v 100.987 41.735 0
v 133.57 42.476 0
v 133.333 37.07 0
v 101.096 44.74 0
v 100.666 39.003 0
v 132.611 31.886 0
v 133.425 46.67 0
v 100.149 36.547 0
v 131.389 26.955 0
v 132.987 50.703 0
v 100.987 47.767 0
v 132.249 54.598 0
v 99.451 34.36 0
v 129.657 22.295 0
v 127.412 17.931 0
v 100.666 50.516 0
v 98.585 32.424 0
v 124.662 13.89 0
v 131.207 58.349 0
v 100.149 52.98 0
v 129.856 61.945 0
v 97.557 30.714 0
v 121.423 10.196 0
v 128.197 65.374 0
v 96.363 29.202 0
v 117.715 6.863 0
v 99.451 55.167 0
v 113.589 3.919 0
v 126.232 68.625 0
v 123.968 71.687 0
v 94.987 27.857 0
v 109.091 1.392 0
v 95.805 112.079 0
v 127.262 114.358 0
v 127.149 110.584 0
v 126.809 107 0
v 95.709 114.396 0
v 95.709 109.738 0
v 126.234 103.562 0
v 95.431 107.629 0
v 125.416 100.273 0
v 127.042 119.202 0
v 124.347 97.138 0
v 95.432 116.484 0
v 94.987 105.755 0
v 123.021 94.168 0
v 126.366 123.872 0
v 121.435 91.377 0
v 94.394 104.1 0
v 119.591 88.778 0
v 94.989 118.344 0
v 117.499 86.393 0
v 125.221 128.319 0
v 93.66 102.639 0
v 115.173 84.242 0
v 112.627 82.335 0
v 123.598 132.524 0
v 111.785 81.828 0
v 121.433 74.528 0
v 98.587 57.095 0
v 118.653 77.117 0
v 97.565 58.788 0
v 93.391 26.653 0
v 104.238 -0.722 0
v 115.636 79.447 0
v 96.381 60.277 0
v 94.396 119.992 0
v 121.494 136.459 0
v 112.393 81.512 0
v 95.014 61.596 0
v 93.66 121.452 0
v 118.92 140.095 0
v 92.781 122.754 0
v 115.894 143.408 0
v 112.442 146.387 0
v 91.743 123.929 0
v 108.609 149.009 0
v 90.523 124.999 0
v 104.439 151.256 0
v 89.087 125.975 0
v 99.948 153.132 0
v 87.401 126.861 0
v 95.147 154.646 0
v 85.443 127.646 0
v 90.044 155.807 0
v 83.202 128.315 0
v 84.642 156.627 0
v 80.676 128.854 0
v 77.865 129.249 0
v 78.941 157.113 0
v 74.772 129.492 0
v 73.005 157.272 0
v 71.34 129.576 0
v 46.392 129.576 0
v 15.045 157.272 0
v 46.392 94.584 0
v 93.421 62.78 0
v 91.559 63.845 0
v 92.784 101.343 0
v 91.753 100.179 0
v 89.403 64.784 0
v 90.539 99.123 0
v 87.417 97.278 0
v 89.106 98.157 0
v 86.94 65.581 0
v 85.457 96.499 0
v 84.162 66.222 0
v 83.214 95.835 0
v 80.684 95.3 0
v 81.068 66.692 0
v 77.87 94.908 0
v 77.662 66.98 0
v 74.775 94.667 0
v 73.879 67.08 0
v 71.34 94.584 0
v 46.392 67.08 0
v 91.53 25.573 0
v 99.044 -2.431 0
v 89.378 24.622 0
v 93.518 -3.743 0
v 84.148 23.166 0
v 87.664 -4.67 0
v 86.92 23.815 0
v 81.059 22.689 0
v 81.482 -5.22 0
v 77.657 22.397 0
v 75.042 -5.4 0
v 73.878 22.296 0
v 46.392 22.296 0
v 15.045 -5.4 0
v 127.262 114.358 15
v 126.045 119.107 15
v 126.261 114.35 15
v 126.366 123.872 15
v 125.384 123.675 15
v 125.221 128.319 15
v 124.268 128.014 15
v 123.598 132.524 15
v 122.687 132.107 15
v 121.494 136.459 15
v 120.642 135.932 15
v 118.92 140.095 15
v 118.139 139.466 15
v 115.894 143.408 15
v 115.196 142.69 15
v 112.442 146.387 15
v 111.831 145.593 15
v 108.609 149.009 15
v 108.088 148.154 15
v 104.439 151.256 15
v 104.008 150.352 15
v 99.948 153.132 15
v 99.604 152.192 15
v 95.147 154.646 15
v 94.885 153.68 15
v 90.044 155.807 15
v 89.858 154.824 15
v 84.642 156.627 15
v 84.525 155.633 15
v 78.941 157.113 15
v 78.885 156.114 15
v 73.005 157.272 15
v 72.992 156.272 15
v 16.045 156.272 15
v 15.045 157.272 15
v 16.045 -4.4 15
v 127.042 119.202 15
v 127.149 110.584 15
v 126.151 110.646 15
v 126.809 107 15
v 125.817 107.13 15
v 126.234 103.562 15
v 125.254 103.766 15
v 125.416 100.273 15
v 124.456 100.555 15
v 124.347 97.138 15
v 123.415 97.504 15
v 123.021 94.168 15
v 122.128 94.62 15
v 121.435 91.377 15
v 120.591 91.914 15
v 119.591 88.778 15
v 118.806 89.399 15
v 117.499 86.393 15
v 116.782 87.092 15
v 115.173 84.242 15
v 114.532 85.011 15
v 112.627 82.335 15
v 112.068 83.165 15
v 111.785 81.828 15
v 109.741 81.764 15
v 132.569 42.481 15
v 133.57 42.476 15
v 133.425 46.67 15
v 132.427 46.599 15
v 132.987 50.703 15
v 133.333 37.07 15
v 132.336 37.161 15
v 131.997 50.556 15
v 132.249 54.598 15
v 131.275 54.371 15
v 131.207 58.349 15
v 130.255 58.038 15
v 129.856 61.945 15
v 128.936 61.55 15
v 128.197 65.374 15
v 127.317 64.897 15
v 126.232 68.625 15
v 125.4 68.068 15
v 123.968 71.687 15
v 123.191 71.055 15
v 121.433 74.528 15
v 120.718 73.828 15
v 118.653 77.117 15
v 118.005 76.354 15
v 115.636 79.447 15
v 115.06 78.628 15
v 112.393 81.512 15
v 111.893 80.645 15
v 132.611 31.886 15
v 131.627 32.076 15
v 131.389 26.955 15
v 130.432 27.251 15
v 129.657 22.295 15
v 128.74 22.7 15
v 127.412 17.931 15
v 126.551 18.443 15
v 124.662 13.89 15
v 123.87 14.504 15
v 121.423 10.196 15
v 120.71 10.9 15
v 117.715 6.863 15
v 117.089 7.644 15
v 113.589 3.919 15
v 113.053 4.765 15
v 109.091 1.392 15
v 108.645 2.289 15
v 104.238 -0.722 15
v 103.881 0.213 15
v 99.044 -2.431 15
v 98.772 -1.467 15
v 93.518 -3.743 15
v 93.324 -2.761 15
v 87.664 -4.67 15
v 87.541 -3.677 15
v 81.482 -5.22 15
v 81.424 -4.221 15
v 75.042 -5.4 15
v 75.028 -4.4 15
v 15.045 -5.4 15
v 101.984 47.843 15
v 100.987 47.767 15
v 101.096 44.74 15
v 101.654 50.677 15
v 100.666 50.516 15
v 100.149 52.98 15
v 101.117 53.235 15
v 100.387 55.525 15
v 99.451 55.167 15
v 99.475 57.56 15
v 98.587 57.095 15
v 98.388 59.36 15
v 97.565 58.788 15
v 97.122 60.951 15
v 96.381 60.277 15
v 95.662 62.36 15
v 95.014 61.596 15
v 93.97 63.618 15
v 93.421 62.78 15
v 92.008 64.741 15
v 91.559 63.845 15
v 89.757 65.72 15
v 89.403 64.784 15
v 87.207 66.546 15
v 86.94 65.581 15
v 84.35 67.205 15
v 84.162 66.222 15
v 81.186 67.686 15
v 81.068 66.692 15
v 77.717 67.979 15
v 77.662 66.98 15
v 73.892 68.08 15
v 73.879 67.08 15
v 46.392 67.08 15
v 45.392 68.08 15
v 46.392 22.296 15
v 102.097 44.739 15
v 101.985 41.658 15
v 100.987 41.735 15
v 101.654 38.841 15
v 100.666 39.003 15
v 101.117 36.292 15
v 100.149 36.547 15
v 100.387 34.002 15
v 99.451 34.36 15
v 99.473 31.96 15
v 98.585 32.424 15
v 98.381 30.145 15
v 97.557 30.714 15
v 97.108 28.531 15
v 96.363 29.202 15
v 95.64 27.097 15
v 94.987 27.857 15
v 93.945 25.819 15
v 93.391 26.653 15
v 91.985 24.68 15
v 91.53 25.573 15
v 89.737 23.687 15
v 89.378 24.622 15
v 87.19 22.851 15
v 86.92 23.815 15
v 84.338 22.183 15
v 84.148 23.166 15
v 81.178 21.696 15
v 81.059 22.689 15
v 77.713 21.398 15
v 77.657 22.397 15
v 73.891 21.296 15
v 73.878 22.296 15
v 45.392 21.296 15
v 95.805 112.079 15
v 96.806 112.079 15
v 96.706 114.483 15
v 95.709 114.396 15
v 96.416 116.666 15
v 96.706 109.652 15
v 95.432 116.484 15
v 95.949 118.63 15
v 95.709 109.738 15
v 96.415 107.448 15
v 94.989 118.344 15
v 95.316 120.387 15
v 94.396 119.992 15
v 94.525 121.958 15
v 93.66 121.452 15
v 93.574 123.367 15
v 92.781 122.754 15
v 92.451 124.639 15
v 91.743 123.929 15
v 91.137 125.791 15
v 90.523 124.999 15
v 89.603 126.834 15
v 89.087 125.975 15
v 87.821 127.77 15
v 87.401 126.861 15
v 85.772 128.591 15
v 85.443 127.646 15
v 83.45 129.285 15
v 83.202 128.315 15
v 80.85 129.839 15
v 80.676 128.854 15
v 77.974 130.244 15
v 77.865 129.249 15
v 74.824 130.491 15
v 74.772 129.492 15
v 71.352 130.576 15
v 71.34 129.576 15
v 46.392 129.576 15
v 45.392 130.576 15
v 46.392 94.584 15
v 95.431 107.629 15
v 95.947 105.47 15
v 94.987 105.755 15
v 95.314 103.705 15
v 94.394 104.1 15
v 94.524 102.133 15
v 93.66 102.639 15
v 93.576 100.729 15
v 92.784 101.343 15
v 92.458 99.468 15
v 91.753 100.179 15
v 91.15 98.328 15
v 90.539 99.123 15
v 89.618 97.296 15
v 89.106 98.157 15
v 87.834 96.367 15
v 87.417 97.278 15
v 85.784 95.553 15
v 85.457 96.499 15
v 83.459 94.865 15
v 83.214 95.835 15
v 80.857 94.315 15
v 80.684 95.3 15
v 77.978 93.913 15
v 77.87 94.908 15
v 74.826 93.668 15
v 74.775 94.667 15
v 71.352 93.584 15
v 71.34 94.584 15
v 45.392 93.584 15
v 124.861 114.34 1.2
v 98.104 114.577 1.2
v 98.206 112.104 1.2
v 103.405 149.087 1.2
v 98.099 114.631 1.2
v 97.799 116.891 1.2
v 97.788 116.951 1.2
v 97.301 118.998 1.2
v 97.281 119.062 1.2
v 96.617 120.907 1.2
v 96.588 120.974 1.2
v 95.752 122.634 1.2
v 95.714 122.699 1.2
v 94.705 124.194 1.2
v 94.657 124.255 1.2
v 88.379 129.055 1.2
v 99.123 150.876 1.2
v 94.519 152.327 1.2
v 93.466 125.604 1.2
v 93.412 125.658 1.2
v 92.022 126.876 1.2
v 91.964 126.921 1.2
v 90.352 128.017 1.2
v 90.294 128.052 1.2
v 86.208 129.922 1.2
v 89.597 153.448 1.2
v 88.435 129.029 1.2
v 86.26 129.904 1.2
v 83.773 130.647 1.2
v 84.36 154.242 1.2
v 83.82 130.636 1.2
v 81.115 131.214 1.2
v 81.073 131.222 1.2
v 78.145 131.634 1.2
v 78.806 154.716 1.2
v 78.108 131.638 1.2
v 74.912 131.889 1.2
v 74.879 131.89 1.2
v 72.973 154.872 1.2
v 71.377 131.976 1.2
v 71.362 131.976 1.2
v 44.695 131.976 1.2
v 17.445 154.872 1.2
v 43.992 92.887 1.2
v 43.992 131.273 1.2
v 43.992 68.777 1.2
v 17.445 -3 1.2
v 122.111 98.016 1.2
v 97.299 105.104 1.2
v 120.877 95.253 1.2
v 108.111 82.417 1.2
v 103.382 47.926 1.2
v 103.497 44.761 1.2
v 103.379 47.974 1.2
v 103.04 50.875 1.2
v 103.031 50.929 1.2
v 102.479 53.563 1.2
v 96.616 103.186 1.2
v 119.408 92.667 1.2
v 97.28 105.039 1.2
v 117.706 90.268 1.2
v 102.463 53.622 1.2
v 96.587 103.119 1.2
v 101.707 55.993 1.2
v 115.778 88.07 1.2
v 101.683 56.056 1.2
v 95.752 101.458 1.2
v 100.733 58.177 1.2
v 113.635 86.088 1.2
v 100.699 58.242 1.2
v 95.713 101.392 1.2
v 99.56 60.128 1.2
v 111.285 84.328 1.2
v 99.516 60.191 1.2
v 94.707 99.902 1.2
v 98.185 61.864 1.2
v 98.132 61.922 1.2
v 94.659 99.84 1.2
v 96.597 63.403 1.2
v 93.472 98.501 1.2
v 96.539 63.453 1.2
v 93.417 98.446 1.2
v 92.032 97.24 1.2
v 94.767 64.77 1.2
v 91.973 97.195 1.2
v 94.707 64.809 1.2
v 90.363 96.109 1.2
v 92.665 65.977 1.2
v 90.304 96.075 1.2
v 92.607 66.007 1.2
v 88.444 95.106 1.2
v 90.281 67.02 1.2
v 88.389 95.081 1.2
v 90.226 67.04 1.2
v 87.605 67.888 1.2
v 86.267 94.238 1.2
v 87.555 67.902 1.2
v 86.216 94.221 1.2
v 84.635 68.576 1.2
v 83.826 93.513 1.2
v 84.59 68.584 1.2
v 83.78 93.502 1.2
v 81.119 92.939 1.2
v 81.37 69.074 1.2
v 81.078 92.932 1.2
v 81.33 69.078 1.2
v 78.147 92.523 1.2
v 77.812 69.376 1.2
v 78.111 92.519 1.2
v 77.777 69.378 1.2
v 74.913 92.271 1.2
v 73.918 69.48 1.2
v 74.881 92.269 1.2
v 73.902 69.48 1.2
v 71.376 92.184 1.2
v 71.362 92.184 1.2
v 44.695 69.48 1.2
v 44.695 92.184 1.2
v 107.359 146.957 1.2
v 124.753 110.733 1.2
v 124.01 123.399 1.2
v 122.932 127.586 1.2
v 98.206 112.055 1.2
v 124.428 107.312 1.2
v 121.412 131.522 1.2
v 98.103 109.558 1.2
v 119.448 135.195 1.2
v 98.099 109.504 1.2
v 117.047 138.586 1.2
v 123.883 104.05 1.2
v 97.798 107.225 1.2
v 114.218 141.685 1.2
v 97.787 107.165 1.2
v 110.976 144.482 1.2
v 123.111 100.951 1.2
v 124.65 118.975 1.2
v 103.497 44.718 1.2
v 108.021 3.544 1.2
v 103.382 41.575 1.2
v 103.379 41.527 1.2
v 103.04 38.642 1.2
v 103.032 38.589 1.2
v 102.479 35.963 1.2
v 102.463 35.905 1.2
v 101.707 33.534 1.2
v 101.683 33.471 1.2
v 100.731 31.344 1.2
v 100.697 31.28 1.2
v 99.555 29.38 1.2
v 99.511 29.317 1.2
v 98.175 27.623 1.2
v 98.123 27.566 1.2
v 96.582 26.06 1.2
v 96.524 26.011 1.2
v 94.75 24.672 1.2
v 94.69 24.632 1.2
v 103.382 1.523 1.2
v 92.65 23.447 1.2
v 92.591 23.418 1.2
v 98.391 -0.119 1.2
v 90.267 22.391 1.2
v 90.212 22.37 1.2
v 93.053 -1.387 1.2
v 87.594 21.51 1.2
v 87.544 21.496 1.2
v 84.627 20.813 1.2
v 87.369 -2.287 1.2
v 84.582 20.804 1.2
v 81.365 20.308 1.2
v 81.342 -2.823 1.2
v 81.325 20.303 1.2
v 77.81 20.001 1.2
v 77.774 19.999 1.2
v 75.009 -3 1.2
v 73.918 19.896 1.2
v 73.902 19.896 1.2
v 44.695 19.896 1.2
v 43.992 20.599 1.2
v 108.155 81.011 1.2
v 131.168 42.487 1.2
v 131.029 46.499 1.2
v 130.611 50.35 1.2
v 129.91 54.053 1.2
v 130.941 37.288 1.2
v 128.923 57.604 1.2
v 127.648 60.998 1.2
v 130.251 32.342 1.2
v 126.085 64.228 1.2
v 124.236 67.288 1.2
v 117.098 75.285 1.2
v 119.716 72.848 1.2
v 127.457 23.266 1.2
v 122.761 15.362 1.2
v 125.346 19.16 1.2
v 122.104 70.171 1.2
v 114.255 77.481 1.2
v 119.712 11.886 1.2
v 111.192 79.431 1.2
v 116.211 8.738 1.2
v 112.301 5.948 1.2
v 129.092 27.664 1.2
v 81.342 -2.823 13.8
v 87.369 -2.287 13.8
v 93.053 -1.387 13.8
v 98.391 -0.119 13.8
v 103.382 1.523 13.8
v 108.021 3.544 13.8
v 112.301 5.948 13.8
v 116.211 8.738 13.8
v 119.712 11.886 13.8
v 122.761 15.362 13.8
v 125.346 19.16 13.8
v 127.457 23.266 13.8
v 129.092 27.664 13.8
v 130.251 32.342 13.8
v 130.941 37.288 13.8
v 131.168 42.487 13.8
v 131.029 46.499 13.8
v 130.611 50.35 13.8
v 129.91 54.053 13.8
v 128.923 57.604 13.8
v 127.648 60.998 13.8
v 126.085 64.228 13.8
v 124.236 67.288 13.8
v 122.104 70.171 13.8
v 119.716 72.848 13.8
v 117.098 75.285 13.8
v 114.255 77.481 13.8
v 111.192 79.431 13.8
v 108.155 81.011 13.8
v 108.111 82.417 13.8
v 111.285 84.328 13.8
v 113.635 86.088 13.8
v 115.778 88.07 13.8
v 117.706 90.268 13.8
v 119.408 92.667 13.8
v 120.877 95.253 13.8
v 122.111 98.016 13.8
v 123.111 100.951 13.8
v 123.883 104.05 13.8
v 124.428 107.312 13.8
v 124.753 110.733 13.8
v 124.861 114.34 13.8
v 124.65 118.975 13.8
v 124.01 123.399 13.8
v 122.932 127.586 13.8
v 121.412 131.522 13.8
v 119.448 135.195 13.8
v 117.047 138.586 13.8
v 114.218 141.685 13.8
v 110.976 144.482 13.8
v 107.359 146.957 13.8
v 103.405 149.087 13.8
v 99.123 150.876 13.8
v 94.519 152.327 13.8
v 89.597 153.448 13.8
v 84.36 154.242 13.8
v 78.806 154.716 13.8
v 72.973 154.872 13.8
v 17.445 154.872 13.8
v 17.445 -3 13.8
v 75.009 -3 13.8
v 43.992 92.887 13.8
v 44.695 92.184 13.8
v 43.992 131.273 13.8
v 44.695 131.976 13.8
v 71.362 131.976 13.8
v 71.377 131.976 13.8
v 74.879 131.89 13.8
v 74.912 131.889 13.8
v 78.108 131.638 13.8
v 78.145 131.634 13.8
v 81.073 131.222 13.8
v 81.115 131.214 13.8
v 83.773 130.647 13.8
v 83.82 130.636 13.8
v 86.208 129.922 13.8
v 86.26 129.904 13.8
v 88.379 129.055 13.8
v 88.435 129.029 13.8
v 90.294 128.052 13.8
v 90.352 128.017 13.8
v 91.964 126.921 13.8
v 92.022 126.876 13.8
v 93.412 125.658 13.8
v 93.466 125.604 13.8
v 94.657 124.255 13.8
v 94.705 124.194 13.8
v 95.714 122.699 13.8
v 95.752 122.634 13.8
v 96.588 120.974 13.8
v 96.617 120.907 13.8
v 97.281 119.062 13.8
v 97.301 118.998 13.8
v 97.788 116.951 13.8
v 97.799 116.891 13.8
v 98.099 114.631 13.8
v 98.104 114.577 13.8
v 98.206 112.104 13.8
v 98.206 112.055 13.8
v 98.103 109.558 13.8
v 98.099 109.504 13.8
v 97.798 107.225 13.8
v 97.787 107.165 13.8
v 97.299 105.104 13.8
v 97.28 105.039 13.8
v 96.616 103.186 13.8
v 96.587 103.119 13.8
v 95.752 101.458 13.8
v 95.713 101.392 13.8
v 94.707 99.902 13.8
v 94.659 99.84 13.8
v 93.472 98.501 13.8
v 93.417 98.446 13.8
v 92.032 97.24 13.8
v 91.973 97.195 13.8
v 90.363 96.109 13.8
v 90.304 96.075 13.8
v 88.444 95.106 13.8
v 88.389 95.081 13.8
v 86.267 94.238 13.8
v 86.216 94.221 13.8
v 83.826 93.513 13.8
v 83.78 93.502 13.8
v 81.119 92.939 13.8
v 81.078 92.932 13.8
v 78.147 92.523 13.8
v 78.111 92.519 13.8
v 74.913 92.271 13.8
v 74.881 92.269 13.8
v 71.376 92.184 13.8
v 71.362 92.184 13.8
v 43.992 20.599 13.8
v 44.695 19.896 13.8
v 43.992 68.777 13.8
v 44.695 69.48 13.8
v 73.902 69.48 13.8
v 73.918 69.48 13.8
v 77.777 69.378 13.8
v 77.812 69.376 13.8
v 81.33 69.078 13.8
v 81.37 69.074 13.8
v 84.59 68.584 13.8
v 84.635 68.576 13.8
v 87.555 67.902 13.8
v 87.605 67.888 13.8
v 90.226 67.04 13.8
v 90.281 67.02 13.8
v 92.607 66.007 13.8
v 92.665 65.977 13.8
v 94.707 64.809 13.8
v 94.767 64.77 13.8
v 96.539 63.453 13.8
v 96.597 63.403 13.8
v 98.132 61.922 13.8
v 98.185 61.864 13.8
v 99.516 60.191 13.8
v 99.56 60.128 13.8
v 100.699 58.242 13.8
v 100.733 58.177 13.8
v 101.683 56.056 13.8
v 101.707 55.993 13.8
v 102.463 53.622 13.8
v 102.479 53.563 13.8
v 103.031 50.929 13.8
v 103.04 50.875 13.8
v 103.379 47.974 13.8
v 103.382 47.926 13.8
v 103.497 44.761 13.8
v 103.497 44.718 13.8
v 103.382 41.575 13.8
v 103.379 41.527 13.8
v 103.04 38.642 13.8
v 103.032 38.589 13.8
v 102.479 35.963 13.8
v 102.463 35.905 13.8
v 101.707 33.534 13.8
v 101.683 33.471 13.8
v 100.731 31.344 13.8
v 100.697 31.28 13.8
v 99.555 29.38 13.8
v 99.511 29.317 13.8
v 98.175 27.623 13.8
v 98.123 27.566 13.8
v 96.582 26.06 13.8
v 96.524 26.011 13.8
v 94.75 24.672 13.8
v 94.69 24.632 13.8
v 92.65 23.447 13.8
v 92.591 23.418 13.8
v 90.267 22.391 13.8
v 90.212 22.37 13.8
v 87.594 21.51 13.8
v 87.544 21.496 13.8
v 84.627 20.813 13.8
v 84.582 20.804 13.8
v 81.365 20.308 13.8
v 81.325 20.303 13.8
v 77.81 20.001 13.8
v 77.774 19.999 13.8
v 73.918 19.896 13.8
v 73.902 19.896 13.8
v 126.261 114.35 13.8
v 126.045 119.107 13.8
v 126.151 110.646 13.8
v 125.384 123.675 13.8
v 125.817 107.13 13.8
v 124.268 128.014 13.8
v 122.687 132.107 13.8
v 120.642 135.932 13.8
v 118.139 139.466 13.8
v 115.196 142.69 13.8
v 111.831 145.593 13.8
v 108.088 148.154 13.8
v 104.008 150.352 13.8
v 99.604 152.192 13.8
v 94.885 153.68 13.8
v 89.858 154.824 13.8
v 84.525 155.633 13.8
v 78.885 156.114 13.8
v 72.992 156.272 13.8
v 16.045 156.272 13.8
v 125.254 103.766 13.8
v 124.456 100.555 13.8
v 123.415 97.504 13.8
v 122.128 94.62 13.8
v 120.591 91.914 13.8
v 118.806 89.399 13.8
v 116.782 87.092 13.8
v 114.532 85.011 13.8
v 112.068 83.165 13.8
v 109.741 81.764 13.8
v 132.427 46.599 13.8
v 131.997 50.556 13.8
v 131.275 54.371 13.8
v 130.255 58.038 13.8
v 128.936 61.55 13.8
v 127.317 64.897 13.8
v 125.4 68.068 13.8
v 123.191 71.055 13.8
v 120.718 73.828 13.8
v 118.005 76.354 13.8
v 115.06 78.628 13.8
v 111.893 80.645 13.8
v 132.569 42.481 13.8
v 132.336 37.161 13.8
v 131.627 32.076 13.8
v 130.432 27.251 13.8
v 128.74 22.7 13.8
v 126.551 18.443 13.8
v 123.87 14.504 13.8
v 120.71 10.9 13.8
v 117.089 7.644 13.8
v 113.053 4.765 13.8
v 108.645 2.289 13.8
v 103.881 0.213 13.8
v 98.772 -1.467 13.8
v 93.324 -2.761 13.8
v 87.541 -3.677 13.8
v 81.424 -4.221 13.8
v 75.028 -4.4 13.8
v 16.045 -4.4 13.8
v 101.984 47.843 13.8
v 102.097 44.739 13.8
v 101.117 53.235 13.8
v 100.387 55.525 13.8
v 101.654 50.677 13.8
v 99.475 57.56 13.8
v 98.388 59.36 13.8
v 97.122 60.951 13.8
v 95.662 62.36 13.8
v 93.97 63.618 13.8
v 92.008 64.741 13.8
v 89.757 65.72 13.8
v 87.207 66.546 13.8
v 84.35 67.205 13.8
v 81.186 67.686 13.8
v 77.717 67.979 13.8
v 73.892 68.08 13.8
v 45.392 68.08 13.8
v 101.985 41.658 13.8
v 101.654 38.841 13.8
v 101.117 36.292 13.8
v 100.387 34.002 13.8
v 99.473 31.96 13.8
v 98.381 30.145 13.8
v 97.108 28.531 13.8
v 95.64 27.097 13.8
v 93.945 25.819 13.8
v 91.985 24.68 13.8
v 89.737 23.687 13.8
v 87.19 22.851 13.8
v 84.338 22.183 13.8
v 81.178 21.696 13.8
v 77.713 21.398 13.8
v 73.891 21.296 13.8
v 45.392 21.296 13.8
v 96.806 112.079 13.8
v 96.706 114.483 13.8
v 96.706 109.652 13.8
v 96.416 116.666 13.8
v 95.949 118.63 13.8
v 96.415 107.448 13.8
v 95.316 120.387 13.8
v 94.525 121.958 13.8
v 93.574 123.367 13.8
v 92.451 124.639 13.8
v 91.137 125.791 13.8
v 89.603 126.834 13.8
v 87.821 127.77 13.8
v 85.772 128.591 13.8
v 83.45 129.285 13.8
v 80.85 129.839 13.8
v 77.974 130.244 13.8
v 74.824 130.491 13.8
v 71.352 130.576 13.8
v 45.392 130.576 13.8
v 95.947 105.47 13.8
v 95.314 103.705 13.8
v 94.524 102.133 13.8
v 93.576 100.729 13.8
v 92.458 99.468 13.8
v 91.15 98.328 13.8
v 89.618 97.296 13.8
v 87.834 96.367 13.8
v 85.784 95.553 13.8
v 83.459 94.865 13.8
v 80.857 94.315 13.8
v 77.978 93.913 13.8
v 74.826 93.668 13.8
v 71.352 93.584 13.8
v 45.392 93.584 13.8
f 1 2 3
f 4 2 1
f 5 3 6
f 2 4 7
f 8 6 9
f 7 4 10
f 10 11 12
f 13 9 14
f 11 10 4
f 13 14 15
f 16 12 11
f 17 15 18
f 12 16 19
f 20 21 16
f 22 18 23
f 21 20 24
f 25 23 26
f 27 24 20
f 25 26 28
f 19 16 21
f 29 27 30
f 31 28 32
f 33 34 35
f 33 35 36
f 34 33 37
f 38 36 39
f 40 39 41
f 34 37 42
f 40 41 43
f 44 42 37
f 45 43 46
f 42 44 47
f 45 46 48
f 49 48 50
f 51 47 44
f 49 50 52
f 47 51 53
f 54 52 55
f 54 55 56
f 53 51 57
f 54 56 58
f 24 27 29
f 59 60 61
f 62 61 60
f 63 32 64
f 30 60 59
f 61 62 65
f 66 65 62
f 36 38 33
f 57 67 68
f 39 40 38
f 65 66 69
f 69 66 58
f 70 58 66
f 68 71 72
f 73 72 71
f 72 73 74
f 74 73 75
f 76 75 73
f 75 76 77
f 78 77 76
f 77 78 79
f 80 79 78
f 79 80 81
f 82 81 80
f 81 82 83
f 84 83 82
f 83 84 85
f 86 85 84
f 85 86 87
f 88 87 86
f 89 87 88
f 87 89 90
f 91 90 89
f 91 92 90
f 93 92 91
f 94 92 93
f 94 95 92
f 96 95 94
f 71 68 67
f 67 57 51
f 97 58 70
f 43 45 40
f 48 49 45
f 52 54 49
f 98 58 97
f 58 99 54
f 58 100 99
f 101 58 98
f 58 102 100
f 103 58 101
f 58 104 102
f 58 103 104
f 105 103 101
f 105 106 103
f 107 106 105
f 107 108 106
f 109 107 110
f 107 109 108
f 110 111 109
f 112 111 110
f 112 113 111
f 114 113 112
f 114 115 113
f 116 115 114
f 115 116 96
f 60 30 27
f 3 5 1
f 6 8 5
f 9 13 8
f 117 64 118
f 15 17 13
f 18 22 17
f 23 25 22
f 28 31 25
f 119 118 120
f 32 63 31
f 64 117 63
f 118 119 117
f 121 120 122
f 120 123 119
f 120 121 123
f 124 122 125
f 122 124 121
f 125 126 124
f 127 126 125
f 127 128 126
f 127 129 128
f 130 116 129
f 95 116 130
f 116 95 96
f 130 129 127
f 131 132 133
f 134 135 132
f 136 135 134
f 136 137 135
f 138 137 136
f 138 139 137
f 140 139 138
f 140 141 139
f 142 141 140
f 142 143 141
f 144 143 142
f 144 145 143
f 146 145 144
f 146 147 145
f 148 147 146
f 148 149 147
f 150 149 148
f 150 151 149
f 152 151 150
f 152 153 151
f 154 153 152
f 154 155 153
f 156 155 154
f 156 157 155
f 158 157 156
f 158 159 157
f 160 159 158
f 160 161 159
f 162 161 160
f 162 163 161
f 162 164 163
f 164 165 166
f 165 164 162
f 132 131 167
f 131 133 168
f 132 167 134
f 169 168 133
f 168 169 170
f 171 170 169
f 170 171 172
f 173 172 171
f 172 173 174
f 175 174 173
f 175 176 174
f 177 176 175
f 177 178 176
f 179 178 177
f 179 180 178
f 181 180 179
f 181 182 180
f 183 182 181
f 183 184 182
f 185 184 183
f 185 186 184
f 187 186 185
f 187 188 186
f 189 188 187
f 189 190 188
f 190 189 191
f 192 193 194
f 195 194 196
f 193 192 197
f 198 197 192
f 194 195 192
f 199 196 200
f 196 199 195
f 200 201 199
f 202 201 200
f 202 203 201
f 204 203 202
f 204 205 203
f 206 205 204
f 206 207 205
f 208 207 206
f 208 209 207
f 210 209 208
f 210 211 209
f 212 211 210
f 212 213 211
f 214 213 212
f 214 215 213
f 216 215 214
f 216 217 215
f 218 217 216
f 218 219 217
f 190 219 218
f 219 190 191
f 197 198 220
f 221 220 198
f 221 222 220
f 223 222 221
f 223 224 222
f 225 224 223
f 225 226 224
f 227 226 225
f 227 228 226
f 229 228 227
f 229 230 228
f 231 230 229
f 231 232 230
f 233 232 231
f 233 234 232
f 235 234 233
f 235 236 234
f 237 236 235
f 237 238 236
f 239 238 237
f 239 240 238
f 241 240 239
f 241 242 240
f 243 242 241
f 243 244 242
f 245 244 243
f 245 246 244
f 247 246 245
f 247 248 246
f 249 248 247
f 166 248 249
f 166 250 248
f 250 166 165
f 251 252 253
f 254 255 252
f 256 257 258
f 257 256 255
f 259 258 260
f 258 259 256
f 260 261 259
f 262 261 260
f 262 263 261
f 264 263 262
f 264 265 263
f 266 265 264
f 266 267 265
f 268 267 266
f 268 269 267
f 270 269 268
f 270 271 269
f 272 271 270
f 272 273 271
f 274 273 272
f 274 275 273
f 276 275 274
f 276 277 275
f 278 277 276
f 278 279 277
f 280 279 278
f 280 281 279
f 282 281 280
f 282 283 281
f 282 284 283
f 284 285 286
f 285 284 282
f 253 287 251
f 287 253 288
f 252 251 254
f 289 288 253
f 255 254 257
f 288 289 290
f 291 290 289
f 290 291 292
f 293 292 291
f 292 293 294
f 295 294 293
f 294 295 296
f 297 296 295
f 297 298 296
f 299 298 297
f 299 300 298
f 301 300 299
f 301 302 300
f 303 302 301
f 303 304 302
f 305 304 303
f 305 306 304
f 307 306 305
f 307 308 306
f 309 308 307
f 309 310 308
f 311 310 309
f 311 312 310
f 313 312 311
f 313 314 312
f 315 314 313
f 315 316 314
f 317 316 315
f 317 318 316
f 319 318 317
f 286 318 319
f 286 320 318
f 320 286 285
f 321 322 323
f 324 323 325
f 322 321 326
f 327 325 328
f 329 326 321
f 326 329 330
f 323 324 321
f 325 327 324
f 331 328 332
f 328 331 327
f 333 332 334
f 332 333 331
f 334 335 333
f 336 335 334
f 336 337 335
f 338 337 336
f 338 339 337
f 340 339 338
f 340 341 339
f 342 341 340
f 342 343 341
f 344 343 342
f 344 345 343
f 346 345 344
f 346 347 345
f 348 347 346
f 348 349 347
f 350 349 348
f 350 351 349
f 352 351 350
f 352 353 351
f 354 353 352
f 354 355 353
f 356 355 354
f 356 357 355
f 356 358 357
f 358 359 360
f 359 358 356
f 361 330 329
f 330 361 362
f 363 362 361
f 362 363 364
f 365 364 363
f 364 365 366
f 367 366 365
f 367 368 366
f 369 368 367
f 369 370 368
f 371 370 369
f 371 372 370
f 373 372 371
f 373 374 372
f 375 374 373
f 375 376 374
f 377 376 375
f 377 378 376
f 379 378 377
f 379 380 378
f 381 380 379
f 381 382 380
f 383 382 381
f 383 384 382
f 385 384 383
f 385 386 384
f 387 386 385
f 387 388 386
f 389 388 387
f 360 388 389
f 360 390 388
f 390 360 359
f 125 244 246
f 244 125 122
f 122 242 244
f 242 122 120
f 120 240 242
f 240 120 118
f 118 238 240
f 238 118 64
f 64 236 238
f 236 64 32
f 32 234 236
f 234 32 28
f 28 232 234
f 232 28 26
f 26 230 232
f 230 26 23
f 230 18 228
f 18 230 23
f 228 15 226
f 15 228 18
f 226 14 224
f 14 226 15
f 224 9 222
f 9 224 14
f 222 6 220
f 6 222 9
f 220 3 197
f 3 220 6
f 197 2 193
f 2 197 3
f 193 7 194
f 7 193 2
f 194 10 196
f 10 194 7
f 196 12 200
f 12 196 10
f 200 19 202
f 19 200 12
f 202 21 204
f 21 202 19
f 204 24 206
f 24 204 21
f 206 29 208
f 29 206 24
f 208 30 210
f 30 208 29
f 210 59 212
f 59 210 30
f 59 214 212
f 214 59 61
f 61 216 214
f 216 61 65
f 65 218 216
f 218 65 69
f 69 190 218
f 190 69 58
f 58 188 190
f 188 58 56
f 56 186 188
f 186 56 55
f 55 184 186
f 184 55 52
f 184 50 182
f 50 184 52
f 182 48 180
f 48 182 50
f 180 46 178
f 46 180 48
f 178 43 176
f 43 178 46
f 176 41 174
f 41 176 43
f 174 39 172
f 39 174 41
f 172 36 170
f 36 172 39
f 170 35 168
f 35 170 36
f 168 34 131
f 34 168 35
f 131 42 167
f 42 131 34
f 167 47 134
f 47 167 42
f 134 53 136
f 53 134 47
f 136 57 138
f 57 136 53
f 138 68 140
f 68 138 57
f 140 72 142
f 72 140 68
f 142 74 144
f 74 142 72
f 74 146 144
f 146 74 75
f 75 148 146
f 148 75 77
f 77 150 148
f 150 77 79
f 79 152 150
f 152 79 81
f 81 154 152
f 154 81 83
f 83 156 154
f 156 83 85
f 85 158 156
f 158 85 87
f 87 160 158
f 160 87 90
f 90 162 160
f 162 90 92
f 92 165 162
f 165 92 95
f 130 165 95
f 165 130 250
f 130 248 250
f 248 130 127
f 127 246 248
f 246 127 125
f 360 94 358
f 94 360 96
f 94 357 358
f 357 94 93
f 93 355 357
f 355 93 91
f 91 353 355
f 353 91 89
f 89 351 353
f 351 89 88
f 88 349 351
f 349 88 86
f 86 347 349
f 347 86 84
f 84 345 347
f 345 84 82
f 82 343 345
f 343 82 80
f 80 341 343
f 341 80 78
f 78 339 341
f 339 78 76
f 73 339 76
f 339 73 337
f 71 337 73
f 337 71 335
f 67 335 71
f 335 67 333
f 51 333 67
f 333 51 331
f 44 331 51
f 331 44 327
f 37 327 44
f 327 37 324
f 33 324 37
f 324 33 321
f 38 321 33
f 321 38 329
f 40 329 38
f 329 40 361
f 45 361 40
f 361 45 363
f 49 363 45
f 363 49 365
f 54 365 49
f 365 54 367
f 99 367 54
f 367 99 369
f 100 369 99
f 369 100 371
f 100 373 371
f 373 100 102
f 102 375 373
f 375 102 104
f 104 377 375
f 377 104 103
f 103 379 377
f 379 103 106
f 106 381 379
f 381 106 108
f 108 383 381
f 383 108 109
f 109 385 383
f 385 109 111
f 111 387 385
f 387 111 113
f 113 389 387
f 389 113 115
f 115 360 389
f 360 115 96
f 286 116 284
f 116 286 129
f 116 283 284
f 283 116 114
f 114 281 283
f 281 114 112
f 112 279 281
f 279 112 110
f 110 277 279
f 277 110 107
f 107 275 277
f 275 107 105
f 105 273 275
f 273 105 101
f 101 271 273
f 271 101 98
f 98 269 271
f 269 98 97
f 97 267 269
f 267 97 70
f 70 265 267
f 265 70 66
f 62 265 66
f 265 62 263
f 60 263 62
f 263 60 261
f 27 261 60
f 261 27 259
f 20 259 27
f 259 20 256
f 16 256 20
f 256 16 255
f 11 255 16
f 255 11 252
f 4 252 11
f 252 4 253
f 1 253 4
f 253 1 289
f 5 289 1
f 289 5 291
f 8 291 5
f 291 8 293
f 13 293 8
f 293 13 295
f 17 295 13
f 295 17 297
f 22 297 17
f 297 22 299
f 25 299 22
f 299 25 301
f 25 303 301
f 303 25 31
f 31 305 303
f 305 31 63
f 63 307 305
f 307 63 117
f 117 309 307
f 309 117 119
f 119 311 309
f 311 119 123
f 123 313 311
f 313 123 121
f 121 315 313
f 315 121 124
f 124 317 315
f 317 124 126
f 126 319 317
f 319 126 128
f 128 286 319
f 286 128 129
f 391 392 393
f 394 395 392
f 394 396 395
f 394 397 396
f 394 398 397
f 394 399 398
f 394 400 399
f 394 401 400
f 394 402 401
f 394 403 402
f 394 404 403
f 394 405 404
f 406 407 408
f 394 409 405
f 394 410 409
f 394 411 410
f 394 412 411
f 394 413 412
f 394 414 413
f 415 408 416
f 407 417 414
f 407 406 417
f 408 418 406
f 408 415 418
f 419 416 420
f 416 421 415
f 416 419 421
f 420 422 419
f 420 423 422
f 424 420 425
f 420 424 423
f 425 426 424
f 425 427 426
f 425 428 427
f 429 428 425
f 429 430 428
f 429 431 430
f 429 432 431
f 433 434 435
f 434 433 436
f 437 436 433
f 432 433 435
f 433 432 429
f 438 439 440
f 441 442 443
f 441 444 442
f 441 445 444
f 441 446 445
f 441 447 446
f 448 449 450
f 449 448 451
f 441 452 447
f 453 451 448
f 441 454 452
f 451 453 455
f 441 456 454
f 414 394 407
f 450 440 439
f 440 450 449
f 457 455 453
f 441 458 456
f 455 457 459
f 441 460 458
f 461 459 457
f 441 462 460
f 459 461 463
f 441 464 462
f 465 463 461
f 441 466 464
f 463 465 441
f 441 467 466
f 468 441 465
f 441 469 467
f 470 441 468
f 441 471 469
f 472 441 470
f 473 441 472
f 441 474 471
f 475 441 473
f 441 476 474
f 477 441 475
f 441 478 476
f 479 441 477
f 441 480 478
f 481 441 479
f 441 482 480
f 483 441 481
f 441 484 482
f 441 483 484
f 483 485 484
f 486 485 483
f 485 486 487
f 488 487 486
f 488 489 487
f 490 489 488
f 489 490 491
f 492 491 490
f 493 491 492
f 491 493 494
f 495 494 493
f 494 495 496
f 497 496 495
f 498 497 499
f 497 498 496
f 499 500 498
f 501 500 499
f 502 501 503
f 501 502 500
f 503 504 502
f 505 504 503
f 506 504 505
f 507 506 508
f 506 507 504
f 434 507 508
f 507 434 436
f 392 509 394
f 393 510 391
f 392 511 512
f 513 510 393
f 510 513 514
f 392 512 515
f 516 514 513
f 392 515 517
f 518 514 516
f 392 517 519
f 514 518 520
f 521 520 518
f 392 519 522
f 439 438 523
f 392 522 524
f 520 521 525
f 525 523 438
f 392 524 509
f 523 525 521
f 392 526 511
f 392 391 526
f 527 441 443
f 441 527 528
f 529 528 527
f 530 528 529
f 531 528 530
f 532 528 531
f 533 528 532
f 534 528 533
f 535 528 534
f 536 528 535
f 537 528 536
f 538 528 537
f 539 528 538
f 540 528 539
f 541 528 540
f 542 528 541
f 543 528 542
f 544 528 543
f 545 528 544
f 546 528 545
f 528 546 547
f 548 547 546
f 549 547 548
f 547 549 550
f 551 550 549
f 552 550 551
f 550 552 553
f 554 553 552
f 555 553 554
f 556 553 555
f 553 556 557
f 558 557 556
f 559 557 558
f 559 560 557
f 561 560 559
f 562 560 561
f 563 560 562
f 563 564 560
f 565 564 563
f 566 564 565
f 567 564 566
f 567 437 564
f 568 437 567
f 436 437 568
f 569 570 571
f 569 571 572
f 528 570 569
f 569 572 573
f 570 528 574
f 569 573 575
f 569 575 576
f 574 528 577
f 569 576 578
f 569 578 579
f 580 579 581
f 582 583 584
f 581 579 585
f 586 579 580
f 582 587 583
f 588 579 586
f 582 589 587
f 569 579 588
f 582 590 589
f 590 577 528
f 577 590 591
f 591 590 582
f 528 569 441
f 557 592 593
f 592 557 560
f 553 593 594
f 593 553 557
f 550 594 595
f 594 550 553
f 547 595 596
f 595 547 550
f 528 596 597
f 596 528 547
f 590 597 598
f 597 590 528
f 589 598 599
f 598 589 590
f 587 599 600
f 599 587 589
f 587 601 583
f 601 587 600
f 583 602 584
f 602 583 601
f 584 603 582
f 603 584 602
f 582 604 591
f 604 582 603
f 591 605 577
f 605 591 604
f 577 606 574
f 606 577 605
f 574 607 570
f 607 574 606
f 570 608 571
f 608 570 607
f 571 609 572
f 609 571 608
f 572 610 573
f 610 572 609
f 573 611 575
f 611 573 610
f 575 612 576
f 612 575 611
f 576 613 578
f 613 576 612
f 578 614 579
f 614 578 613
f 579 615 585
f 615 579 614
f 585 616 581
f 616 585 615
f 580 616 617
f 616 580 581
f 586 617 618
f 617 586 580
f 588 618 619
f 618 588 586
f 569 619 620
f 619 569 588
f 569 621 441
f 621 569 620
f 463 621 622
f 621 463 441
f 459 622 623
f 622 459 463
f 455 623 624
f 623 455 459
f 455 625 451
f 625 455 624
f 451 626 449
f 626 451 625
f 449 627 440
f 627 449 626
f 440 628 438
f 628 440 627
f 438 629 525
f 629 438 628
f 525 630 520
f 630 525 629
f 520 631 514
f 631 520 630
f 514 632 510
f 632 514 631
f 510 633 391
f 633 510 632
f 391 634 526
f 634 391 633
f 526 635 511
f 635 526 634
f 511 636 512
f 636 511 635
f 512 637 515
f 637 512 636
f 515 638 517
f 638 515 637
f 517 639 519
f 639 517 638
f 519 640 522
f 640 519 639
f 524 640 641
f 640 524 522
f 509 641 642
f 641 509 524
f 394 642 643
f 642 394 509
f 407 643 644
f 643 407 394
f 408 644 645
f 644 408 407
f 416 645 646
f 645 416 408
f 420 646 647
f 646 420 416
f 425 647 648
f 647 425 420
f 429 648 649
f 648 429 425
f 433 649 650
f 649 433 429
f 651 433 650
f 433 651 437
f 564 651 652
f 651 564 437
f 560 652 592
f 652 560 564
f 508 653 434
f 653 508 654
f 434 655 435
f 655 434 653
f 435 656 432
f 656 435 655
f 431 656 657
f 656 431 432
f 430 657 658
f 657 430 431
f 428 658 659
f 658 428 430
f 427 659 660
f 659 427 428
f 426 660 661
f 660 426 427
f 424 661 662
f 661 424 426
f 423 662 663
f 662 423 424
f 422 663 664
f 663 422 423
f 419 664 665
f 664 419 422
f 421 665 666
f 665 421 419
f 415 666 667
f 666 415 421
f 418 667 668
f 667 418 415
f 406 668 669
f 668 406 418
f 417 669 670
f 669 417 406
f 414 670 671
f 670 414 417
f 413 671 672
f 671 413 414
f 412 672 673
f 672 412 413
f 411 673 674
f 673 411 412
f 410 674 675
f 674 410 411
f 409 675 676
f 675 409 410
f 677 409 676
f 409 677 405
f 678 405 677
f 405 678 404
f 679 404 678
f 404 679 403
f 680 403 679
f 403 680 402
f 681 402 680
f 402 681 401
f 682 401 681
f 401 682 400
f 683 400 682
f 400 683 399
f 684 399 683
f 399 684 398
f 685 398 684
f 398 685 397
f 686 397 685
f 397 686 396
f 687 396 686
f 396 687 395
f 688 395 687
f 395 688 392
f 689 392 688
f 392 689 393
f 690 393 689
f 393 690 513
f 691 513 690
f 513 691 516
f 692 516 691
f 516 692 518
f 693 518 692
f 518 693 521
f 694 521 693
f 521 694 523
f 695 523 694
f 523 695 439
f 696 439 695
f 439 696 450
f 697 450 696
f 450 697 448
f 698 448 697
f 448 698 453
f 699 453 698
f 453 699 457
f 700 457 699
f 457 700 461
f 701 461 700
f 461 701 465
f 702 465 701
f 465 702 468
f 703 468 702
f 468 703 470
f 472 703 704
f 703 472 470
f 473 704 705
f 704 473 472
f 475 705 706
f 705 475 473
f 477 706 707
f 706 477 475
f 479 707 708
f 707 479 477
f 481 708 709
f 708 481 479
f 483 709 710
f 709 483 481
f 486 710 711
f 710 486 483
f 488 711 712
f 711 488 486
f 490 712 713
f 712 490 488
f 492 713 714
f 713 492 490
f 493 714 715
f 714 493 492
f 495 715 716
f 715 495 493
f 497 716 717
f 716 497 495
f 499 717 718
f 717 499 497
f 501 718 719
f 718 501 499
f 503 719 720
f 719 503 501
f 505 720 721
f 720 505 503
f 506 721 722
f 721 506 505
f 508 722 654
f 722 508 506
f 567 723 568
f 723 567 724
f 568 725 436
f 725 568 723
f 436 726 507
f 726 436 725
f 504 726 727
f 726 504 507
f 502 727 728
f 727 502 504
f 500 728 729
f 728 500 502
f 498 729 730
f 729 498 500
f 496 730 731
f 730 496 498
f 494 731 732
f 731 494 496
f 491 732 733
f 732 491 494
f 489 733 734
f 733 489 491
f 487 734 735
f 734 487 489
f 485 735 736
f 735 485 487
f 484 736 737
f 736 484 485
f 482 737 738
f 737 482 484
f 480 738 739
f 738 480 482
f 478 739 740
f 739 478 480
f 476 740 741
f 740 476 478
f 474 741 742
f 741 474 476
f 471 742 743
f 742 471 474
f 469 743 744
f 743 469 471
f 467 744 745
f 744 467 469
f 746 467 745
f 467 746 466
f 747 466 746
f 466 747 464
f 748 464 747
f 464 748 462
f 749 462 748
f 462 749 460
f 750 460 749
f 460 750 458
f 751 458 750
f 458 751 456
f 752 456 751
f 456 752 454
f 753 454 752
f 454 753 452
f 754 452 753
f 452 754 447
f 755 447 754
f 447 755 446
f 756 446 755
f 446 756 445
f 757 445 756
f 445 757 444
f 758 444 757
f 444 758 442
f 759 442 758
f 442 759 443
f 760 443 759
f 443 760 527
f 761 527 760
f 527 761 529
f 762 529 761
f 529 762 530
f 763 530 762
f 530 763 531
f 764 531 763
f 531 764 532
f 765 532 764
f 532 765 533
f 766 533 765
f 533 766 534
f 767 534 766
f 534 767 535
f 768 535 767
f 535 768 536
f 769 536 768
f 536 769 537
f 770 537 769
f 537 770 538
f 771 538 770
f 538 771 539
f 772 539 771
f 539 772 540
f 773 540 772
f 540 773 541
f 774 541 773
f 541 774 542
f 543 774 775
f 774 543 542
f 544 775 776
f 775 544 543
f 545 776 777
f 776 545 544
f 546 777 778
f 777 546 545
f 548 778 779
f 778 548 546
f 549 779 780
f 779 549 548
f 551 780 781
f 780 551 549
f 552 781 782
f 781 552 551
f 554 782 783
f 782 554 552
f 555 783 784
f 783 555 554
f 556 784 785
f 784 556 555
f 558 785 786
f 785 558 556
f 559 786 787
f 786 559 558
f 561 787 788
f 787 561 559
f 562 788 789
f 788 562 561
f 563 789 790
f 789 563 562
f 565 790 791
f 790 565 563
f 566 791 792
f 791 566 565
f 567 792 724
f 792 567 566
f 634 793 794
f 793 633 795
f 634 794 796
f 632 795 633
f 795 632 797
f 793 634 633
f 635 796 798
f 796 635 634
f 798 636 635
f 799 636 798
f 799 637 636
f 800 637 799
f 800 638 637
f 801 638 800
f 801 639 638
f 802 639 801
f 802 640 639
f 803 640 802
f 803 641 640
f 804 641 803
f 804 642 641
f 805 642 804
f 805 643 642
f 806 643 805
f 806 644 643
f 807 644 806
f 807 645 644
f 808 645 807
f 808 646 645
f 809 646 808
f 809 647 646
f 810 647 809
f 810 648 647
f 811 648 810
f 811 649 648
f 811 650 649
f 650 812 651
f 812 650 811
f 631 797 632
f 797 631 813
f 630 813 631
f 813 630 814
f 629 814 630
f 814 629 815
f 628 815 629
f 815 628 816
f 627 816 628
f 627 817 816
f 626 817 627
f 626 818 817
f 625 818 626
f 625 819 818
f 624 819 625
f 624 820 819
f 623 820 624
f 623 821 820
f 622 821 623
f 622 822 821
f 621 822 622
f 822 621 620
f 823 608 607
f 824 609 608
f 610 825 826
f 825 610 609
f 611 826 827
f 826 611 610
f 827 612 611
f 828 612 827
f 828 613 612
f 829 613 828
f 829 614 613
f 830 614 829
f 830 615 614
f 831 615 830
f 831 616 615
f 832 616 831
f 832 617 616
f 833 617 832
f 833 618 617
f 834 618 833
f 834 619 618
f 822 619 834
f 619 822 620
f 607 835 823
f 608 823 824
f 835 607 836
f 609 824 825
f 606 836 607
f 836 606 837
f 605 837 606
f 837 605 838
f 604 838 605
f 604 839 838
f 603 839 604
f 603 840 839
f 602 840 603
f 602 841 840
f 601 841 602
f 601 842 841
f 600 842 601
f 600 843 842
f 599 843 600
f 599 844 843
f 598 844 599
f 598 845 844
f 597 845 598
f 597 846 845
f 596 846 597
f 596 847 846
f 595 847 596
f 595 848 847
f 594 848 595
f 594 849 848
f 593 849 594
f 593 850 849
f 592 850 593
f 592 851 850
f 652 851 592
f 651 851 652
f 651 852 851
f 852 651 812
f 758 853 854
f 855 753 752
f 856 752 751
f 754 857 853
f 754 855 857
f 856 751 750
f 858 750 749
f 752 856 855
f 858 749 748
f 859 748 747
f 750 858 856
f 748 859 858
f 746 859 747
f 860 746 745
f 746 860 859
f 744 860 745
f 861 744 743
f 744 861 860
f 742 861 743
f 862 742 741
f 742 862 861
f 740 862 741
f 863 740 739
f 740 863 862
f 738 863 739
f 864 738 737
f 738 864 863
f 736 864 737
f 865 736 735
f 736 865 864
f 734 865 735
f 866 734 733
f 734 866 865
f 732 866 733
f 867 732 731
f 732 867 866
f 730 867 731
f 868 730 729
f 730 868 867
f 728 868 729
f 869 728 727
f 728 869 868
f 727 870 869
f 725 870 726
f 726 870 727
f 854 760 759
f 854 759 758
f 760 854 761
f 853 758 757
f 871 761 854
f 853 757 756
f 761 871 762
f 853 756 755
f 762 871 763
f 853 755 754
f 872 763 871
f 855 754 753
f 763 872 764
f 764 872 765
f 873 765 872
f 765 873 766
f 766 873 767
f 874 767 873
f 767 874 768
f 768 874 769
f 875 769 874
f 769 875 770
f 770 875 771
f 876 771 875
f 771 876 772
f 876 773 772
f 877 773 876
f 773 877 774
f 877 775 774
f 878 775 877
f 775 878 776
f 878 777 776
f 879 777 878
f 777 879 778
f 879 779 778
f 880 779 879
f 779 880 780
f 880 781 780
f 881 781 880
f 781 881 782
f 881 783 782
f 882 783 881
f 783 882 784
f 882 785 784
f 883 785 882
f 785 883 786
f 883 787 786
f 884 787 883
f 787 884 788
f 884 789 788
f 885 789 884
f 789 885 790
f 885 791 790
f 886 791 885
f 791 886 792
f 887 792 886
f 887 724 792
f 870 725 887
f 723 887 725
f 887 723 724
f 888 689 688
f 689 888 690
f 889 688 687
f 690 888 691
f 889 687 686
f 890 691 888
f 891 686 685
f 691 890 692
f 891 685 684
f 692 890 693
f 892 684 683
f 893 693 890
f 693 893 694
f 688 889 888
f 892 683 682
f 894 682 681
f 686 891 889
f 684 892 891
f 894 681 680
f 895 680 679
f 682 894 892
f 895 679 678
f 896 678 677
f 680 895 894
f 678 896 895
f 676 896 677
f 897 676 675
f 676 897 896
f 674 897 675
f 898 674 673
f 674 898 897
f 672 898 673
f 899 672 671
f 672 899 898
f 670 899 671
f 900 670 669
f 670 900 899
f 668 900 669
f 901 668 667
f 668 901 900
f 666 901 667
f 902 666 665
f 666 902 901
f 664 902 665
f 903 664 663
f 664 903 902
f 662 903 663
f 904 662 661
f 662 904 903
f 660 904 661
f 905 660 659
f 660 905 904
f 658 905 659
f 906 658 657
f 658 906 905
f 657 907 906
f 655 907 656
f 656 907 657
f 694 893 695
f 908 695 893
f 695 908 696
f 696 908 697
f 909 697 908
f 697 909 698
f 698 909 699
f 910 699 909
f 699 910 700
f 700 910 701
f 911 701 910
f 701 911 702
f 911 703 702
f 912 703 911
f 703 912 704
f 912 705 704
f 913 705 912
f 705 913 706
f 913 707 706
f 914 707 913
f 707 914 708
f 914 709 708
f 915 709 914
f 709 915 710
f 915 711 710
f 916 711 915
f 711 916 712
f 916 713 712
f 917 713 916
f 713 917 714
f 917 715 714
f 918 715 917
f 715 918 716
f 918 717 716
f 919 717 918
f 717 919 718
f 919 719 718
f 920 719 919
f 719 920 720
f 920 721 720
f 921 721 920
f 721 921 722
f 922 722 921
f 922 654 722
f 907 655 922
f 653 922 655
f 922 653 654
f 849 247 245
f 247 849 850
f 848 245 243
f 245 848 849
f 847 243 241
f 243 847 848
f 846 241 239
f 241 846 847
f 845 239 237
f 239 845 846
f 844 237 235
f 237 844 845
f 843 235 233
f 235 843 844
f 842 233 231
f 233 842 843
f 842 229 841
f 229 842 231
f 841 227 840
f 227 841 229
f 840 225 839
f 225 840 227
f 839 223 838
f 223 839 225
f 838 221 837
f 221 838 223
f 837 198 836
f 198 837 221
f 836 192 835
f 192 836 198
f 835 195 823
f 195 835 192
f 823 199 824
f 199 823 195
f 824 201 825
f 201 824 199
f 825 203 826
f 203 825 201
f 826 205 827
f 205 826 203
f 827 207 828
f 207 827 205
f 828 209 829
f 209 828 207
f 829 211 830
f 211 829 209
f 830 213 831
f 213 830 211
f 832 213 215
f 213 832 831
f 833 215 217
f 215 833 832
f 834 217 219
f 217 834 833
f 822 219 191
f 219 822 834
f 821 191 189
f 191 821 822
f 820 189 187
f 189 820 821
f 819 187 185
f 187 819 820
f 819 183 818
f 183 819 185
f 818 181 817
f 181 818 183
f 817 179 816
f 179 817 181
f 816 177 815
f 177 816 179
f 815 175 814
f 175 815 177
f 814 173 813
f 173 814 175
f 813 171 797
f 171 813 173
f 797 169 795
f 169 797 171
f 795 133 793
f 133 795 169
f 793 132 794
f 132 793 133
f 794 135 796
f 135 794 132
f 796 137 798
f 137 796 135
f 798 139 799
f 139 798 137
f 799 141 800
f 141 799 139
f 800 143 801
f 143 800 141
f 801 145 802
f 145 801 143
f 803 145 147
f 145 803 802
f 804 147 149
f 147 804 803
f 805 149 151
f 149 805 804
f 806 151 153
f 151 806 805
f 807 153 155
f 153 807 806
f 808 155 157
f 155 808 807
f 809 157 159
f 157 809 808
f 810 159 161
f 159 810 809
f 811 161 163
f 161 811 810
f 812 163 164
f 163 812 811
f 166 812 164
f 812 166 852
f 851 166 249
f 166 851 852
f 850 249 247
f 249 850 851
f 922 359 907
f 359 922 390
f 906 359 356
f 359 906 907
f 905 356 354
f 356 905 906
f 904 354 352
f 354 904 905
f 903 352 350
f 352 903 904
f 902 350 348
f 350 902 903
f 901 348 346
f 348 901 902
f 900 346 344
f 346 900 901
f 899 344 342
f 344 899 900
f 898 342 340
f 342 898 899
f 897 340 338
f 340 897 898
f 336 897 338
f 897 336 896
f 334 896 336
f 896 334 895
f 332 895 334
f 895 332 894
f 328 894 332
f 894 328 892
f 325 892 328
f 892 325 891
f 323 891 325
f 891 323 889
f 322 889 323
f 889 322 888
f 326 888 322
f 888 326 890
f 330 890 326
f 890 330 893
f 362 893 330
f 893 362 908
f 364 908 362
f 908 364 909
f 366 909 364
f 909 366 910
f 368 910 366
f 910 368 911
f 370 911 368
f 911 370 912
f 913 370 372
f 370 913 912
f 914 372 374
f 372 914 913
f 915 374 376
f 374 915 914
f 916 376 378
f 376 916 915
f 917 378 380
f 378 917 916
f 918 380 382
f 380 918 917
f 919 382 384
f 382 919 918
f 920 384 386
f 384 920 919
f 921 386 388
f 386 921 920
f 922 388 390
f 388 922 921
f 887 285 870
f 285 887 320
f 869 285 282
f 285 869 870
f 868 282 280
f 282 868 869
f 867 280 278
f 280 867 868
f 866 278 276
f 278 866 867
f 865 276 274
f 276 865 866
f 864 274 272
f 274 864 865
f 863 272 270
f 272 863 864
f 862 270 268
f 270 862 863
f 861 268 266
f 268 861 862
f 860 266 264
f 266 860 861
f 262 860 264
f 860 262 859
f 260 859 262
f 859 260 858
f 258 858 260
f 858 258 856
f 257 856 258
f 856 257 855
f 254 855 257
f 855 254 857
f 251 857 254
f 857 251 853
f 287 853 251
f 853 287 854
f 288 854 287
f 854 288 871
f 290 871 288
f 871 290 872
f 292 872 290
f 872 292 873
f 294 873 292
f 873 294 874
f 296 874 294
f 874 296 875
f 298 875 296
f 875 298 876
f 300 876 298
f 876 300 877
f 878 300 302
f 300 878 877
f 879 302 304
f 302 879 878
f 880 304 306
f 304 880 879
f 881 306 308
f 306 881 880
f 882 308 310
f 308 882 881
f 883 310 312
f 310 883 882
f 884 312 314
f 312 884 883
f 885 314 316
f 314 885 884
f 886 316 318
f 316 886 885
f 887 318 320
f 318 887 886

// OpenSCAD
// file: include/signmaker.scad
// OpenSCAD LED signmaker
// to be included in own OpenSCAD scripts
// inspired by BigClive's livestream from 2022-06-11.

module signbodyio(h=10, wi=1.2, wo=1.2, fl=1.2, fh=1.2, pl=0.2, incha=true) {
    pf=0.001;
    difference() {
        linear_extrude(height=h)
            offset(delta=wo)
                children();
        translate([0,0,fl])
            linear_extrude(height=h-fl+pf)
                offset(delta=-wi, chamfer=incha)
                    children();
        translate([0,0,h-fh])
            linear_extrude(height=h)
                offset(delta=pl)
                    children();
    }
}

module signbody(h=10, ww=2.4, fl=1.2, fh=1.2, pl=0.2, incha=true) {
    signbodyio(h=h, wi=ww/2, wo=ww/2, fl=fl, fh=fh, pl=pl, incha=incha)
        children();
}

module signface(fh=1.2) {
    linear_extrude(height=fh)
        children();
}

module makesignio(h=10, wi=1.2, wo=1.2, fl=1.2, fh=1.2, pl=0.2, incha=true, face=false) {
    if(face)
        signface(fh=fh)
            children();
    else
        signbodyio(h=h, wi=wi, wo=wo, fl=fl, fh=fh, pl=pl)
            children();
}

module makesign(h=10, ww=2.4, fl=1.2, fh=1.2, pl=0.2, incha=true, face=false) {
    makesignio(h=h, wi=ww/2, wo=ww/2, fl=fl, fh=fh, pl=pl, incha=incha, face=face)
        children();
}
// main file
// OpenSCAD sign maker (box sign with offset)
//
// Inspried by script in description of
// BigClive's livestream from 2022-06-11.
//
// Applying an offset allows to make letters bolder.
//
// Select the font name from the list of available fonts:
// Menu: "Help" > "Font List"
//
// Suitable fonts might be found here:
// https://fonts.google.com/?category=Display,Handwriting

//Text to render
text="B";

//Font to use
//form: https://fonts.google.com/?category=Display,Handwriting
font="Qwigley:style=Regular";

//Text size
size=150;

//Text spacing
space=1.0;

//Height of the sign body
h=15;

//Make each letter bolder by a specified offset
delta=4.2;

//Wall width
ww=2.4;

//Floor height (set to -1 for open base)
fl=1.2;

//Face height
fh=1.2;

//Play for fitting face
pl=0.2;

///////////////////////////
$fn=60;

include <include/signmaker.scad>;

makesign(h=h, ww=ww, fl=fl, fh=fh, pl=pl, face=false) {
    offset(delta=delta)
        text(text, font=font, size=size, spacing=space);
}
